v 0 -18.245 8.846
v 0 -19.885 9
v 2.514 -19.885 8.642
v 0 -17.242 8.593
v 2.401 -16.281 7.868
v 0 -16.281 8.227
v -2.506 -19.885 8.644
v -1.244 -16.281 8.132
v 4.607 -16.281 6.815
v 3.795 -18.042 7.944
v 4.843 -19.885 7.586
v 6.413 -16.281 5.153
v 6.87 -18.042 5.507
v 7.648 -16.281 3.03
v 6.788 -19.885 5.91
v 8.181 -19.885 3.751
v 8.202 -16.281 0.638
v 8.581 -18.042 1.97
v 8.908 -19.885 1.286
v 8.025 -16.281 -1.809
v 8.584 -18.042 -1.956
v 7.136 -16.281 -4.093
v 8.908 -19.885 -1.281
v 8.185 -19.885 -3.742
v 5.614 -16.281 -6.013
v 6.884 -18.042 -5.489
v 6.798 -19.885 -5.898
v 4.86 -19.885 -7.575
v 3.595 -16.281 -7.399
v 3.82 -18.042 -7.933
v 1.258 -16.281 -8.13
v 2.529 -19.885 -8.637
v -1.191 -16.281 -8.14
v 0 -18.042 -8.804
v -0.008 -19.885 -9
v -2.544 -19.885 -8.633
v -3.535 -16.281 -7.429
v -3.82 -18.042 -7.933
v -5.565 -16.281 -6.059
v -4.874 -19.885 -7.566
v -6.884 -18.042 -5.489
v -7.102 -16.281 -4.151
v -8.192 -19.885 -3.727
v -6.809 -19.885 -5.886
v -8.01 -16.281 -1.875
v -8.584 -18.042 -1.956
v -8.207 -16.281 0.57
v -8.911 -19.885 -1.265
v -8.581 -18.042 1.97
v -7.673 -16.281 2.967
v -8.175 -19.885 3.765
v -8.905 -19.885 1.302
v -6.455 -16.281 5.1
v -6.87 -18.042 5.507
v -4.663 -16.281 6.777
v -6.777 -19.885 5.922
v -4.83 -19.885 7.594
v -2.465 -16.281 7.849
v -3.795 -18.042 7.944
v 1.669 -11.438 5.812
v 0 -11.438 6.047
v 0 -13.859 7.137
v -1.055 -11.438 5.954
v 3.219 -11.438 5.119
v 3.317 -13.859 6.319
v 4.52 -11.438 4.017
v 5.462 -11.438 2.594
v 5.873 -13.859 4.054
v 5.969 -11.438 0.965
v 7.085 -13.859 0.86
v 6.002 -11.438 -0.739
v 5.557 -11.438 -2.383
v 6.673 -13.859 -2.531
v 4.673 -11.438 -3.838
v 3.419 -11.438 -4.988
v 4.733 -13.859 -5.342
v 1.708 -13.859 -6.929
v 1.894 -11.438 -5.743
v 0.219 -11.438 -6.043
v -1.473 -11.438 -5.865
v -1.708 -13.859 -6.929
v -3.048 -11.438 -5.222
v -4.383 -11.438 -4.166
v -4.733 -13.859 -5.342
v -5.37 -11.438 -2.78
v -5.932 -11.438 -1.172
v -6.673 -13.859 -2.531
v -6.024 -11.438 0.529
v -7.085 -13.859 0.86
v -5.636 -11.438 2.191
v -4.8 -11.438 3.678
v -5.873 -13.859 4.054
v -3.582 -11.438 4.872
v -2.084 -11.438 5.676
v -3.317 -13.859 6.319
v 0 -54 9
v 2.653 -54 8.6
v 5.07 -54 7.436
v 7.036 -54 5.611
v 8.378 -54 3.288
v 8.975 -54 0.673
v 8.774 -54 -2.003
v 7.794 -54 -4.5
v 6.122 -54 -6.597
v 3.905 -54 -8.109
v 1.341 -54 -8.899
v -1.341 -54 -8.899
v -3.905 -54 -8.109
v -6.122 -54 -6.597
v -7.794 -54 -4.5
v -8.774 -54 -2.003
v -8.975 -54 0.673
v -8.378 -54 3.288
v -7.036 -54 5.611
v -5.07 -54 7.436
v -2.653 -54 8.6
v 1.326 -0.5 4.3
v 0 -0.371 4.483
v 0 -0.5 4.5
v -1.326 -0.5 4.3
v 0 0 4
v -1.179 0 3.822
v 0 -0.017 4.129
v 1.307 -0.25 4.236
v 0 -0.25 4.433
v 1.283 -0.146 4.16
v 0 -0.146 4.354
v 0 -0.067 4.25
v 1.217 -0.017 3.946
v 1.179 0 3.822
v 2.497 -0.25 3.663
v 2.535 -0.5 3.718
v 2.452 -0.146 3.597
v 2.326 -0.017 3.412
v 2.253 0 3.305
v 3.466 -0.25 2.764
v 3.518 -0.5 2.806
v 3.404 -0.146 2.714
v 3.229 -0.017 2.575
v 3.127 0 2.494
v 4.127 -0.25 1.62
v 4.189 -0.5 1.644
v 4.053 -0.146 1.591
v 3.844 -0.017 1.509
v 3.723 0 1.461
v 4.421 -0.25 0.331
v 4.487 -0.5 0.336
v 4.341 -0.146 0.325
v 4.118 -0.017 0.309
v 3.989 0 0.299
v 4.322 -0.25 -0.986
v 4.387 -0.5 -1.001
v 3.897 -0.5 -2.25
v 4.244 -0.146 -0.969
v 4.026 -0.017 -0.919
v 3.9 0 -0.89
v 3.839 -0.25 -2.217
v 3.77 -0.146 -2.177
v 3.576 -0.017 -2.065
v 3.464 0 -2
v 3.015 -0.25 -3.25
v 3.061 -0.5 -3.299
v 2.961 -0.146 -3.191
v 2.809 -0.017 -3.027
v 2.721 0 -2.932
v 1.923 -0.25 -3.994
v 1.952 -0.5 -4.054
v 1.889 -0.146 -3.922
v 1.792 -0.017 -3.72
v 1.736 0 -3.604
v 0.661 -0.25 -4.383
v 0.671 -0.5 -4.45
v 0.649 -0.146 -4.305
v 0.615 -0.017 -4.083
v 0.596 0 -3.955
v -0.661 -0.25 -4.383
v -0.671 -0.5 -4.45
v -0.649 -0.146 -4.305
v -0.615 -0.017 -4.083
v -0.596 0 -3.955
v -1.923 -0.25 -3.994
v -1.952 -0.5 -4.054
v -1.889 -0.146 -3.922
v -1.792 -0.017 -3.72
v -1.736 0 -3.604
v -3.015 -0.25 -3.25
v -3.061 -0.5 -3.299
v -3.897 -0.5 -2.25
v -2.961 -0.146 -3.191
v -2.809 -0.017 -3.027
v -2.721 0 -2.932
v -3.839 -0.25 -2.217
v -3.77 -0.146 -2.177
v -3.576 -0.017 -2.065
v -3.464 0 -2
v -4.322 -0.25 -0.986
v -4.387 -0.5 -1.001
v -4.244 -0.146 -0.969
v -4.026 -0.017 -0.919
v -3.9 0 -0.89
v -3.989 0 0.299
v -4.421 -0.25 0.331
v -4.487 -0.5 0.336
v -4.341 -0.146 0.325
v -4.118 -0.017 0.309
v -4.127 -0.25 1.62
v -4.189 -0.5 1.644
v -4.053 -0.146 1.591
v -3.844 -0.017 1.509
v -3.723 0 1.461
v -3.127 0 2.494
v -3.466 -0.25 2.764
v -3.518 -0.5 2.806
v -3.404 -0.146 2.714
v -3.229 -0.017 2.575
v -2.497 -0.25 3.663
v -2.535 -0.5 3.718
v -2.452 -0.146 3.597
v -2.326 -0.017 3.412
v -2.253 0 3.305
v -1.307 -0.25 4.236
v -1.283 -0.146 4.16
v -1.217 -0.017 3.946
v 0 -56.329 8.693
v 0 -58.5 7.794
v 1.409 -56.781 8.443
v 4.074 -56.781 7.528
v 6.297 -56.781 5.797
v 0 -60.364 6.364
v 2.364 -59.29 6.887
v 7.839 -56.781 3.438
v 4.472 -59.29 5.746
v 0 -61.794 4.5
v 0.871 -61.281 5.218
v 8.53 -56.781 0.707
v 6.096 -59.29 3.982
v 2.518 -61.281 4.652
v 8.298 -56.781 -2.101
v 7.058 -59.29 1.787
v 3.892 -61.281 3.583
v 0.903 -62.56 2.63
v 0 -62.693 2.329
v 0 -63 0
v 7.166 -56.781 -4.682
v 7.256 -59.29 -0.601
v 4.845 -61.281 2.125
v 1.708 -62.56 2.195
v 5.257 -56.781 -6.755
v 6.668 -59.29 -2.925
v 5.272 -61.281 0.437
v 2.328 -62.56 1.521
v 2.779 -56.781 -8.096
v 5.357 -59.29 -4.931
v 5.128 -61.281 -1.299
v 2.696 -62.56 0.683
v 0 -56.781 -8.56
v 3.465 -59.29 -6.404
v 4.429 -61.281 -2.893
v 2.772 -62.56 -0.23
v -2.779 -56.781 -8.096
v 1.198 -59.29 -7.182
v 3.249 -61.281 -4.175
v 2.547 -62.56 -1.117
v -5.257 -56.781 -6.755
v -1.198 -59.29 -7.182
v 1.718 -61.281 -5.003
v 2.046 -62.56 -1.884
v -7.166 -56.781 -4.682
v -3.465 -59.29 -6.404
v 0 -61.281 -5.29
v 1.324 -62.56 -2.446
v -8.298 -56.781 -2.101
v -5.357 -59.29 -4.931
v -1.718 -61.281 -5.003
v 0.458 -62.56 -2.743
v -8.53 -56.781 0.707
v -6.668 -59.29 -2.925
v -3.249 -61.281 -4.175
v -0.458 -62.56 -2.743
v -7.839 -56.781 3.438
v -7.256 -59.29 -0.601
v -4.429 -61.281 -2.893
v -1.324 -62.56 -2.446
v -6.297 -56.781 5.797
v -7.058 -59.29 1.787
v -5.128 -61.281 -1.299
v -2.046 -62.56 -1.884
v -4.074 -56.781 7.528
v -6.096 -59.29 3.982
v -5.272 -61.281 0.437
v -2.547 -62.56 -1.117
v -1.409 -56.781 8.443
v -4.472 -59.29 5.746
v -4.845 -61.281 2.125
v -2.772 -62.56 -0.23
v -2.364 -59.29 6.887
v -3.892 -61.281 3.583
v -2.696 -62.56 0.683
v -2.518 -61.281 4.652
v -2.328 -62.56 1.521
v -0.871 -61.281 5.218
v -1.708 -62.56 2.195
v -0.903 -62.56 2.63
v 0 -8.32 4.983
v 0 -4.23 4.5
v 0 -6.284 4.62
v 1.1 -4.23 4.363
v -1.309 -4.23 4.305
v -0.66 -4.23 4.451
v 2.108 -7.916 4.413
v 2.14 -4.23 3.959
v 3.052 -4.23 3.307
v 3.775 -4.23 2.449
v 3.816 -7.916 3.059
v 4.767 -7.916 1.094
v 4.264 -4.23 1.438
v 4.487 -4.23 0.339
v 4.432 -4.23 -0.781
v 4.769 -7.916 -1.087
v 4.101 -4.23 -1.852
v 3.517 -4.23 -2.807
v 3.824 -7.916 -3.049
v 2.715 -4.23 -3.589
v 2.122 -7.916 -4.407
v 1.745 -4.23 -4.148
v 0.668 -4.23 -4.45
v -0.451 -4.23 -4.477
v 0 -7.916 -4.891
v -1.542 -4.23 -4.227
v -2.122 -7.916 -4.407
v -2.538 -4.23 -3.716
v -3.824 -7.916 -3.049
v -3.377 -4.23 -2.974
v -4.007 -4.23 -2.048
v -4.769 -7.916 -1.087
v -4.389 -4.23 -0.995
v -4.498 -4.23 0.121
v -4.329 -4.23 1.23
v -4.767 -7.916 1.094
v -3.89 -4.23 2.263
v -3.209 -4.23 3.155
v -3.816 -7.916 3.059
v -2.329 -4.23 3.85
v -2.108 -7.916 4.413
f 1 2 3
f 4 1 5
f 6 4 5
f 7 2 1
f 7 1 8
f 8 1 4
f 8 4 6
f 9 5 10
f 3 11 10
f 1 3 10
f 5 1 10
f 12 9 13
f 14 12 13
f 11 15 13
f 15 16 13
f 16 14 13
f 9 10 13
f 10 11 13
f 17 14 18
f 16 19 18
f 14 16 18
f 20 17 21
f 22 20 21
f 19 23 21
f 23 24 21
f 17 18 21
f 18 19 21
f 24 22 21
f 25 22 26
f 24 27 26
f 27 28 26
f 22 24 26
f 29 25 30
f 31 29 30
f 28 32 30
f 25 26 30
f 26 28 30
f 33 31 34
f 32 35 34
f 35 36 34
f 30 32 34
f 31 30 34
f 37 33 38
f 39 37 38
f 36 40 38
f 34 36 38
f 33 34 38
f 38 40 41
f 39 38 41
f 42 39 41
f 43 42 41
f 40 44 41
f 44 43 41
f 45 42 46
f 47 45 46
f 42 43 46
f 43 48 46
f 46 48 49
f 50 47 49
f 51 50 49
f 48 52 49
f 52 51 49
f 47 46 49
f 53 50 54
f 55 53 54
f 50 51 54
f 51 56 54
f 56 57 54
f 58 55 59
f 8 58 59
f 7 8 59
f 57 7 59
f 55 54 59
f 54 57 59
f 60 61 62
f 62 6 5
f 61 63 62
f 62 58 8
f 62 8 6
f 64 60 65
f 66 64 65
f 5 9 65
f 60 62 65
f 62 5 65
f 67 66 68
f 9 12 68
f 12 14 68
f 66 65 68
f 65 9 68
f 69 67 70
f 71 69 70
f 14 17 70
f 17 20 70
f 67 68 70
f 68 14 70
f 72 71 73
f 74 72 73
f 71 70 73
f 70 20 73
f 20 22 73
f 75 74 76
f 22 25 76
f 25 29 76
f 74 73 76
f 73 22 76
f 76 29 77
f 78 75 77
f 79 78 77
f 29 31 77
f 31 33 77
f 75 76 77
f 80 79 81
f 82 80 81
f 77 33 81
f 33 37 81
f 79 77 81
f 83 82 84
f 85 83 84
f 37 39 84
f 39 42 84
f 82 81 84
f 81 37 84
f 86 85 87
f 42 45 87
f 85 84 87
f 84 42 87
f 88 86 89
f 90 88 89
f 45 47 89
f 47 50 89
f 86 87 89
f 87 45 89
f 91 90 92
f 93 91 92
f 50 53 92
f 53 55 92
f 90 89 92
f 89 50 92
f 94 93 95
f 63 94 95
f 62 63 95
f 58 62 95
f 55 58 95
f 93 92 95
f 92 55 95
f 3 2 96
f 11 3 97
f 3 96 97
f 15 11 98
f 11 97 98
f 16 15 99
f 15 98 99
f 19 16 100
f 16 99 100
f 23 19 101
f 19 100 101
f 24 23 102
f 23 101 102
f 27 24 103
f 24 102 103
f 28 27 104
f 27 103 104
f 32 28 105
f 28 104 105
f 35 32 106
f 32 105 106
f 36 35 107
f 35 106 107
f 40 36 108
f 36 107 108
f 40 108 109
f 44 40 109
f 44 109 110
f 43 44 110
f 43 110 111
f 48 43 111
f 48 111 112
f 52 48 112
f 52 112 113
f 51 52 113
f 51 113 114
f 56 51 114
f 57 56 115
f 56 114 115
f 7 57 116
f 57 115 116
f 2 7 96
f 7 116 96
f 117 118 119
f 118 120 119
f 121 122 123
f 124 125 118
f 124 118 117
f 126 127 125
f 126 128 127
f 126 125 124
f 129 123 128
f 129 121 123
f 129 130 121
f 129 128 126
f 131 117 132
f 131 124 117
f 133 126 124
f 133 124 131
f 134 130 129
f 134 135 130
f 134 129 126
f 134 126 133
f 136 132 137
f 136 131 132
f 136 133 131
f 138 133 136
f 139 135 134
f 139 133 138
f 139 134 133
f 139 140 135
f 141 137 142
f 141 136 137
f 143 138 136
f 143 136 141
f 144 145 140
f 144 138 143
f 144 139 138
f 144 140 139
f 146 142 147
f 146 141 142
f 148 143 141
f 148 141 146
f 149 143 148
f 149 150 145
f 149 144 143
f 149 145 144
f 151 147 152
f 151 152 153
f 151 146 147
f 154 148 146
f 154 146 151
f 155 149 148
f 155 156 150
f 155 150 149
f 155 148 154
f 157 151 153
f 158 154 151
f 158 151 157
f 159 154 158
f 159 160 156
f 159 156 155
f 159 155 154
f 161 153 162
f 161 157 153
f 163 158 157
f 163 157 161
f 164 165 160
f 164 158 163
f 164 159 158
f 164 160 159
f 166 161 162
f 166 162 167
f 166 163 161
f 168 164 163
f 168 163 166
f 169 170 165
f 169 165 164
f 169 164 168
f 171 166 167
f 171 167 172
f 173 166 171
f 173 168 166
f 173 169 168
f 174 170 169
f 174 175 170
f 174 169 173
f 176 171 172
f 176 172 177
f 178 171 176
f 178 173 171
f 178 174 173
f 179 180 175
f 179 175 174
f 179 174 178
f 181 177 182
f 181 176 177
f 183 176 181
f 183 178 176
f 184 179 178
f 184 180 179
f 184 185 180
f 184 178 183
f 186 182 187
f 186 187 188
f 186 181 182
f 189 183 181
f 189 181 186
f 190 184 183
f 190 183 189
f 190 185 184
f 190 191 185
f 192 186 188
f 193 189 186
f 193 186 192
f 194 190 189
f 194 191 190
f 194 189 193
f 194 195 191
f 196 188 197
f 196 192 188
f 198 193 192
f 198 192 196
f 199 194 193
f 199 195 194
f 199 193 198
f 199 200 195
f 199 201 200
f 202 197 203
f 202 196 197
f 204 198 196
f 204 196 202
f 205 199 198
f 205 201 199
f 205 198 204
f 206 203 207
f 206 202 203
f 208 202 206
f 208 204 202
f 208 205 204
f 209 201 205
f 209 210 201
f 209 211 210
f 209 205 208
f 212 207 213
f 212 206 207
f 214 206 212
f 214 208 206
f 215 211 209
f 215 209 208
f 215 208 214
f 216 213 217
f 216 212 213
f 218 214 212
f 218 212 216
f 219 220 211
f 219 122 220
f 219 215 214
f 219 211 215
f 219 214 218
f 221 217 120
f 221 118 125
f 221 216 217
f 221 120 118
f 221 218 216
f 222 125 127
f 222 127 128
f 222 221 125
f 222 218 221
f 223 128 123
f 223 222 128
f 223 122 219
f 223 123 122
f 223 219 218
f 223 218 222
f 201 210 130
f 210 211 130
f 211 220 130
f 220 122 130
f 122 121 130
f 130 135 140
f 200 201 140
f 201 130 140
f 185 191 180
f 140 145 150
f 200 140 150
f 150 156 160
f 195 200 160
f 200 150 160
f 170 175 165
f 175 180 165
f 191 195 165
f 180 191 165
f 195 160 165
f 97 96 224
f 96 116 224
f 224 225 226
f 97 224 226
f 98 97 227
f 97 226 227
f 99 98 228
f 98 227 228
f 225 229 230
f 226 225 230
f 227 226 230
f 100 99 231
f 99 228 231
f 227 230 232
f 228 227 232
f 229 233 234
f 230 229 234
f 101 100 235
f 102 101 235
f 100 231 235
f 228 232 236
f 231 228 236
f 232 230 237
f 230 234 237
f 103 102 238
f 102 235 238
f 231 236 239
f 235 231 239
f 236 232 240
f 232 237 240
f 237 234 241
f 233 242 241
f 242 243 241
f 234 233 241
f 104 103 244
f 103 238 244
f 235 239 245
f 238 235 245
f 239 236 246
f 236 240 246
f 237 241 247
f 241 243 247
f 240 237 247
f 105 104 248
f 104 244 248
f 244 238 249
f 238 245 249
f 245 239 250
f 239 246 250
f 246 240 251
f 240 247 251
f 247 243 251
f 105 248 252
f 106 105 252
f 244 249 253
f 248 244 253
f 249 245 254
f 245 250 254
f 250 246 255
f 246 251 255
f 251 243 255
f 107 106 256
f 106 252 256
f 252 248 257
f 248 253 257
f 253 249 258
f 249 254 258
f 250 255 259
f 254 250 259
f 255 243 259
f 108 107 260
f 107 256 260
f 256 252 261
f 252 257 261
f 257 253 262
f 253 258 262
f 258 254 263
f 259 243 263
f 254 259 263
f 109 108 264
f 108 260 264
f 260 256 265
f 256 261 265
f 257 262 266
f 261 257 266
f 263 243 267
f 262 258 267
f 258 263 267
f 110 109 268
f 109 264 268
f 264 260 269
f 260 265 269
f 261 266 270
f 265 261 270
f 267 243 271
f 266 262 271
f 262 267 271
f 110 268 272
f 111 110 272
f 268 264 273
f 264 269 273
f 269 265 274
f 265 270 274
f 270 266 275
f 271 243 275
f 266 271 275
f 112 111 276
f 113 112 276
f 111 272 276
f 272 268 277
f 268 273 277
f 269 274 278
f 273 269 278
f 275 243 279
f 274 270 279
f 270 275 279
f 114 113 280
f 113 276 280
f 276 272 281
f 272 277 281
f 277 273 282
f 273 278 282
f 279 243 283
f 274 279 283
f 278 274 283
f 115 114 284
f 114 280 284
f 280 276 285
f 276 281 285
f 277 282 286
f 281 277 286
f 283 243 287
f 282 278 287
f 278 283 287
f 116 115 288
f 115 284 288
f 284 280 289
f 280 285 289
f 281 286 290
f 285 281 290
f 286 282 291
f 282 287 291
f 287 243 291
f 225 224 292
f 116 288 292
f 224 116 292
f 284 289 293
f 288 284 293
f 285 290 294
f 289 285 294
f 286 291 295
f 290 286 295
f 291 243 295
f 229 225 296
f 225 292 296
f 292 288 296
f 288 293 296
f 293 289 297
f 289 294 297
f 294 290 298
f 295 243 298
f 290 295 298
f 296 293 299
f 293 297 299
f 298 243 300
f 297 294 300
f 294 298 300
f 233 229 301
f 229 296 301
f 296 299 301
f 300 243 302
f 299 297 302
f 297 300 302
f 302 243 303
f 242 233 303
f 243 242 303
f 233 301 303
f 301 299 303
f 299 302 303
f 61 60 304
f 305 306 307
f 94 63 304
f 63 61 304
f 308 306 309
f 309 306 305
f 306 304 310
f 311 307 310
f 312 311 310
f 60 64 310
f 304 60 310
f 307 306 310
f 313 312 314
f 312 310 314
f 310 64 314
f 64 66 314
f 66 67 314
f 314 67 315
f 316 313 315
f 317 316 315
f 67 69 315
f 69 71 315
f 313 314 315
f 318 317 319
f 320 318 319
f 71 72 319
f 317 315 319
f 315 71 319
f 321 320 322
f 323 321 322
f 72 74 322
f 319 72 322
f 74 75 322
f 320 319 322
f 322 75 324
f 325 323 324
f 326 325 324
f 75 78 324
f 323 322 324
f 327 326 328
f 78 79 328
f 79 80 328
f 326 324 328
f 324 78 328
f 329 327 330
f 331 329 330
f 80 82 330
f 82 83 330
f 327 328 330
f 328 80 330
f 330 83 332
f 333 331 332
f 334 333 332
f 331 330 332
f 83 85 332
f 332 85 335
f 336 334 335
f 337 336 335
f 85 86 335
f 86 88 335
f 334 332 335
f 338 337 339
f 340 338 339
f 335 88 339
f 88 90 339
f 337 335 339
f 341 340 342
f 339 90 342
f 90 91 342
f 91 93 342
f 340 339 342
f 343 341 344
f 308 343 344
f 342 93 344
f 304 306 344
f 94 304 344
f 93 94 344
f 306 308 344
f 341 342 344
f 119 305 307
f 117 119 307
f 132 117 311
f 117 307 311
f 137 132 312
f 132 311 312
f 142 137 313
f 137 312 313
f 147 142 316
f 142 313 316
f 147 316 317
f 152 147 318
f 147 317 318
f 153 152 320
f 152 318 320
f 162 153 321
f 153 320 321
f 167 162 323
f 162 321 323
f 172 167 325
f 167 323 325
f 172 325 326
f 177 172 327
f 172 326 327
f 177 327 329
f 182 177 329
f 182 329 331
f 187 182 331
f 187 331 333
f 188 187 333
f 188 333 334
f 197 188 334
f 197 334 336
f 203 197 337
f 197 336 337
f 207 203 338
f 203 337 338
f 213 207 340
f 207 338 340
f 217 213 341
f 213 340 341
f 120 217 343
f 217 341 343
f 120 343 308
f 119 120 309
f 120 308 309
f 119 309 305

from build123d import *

# Parameters (mm, degrees)
F2_R = 9
F3_R = 8.781681
F4_R = 17.563363
F5_R = 0.5


with BuildPart() as f1:
    # F0 (on Right) → F1 (revolve)
    with BuildSketch(Plane.YZ):
        Polygon((-63, 0), (0, 0), (0, 4.5), (-8, 4.5), (-18, 9), (-63, 9), align=None)
    revolve(axis=Axis((0, -31.5, 0), (0, 1, 0)))

    # F2
    f2_edges = [f1.edges().sort_by_distance(p)[0] for p in [
        (0, -63, -9),
    ]]
    fillet(f2_edges, radius=F2_R)

    # F3
    f3_edges = [f1.edges().sort_by_distance(p)[0] for p in [
        (0, -18, -9),
    ]]
    fillet(f3_edges, radius=F3_R)

    # F4
    f4_edges = [f1.edges().sort_by_distance(p)[0] for p in [
        (0, -12.140581, 6.363261),
        (0, -16.281162, -8.226521),
        (0, -8, -4.5),
    ]]
    fillet(f4_edges, radius=F4_R)

    # F5
    f5_edges = [f1.edges().sort_by_distance(p)[0] for p in [
        (0, 0, -4.5),
    ]]
    fillet(f5_edges, radius=F5_R)


solid = f1.part
